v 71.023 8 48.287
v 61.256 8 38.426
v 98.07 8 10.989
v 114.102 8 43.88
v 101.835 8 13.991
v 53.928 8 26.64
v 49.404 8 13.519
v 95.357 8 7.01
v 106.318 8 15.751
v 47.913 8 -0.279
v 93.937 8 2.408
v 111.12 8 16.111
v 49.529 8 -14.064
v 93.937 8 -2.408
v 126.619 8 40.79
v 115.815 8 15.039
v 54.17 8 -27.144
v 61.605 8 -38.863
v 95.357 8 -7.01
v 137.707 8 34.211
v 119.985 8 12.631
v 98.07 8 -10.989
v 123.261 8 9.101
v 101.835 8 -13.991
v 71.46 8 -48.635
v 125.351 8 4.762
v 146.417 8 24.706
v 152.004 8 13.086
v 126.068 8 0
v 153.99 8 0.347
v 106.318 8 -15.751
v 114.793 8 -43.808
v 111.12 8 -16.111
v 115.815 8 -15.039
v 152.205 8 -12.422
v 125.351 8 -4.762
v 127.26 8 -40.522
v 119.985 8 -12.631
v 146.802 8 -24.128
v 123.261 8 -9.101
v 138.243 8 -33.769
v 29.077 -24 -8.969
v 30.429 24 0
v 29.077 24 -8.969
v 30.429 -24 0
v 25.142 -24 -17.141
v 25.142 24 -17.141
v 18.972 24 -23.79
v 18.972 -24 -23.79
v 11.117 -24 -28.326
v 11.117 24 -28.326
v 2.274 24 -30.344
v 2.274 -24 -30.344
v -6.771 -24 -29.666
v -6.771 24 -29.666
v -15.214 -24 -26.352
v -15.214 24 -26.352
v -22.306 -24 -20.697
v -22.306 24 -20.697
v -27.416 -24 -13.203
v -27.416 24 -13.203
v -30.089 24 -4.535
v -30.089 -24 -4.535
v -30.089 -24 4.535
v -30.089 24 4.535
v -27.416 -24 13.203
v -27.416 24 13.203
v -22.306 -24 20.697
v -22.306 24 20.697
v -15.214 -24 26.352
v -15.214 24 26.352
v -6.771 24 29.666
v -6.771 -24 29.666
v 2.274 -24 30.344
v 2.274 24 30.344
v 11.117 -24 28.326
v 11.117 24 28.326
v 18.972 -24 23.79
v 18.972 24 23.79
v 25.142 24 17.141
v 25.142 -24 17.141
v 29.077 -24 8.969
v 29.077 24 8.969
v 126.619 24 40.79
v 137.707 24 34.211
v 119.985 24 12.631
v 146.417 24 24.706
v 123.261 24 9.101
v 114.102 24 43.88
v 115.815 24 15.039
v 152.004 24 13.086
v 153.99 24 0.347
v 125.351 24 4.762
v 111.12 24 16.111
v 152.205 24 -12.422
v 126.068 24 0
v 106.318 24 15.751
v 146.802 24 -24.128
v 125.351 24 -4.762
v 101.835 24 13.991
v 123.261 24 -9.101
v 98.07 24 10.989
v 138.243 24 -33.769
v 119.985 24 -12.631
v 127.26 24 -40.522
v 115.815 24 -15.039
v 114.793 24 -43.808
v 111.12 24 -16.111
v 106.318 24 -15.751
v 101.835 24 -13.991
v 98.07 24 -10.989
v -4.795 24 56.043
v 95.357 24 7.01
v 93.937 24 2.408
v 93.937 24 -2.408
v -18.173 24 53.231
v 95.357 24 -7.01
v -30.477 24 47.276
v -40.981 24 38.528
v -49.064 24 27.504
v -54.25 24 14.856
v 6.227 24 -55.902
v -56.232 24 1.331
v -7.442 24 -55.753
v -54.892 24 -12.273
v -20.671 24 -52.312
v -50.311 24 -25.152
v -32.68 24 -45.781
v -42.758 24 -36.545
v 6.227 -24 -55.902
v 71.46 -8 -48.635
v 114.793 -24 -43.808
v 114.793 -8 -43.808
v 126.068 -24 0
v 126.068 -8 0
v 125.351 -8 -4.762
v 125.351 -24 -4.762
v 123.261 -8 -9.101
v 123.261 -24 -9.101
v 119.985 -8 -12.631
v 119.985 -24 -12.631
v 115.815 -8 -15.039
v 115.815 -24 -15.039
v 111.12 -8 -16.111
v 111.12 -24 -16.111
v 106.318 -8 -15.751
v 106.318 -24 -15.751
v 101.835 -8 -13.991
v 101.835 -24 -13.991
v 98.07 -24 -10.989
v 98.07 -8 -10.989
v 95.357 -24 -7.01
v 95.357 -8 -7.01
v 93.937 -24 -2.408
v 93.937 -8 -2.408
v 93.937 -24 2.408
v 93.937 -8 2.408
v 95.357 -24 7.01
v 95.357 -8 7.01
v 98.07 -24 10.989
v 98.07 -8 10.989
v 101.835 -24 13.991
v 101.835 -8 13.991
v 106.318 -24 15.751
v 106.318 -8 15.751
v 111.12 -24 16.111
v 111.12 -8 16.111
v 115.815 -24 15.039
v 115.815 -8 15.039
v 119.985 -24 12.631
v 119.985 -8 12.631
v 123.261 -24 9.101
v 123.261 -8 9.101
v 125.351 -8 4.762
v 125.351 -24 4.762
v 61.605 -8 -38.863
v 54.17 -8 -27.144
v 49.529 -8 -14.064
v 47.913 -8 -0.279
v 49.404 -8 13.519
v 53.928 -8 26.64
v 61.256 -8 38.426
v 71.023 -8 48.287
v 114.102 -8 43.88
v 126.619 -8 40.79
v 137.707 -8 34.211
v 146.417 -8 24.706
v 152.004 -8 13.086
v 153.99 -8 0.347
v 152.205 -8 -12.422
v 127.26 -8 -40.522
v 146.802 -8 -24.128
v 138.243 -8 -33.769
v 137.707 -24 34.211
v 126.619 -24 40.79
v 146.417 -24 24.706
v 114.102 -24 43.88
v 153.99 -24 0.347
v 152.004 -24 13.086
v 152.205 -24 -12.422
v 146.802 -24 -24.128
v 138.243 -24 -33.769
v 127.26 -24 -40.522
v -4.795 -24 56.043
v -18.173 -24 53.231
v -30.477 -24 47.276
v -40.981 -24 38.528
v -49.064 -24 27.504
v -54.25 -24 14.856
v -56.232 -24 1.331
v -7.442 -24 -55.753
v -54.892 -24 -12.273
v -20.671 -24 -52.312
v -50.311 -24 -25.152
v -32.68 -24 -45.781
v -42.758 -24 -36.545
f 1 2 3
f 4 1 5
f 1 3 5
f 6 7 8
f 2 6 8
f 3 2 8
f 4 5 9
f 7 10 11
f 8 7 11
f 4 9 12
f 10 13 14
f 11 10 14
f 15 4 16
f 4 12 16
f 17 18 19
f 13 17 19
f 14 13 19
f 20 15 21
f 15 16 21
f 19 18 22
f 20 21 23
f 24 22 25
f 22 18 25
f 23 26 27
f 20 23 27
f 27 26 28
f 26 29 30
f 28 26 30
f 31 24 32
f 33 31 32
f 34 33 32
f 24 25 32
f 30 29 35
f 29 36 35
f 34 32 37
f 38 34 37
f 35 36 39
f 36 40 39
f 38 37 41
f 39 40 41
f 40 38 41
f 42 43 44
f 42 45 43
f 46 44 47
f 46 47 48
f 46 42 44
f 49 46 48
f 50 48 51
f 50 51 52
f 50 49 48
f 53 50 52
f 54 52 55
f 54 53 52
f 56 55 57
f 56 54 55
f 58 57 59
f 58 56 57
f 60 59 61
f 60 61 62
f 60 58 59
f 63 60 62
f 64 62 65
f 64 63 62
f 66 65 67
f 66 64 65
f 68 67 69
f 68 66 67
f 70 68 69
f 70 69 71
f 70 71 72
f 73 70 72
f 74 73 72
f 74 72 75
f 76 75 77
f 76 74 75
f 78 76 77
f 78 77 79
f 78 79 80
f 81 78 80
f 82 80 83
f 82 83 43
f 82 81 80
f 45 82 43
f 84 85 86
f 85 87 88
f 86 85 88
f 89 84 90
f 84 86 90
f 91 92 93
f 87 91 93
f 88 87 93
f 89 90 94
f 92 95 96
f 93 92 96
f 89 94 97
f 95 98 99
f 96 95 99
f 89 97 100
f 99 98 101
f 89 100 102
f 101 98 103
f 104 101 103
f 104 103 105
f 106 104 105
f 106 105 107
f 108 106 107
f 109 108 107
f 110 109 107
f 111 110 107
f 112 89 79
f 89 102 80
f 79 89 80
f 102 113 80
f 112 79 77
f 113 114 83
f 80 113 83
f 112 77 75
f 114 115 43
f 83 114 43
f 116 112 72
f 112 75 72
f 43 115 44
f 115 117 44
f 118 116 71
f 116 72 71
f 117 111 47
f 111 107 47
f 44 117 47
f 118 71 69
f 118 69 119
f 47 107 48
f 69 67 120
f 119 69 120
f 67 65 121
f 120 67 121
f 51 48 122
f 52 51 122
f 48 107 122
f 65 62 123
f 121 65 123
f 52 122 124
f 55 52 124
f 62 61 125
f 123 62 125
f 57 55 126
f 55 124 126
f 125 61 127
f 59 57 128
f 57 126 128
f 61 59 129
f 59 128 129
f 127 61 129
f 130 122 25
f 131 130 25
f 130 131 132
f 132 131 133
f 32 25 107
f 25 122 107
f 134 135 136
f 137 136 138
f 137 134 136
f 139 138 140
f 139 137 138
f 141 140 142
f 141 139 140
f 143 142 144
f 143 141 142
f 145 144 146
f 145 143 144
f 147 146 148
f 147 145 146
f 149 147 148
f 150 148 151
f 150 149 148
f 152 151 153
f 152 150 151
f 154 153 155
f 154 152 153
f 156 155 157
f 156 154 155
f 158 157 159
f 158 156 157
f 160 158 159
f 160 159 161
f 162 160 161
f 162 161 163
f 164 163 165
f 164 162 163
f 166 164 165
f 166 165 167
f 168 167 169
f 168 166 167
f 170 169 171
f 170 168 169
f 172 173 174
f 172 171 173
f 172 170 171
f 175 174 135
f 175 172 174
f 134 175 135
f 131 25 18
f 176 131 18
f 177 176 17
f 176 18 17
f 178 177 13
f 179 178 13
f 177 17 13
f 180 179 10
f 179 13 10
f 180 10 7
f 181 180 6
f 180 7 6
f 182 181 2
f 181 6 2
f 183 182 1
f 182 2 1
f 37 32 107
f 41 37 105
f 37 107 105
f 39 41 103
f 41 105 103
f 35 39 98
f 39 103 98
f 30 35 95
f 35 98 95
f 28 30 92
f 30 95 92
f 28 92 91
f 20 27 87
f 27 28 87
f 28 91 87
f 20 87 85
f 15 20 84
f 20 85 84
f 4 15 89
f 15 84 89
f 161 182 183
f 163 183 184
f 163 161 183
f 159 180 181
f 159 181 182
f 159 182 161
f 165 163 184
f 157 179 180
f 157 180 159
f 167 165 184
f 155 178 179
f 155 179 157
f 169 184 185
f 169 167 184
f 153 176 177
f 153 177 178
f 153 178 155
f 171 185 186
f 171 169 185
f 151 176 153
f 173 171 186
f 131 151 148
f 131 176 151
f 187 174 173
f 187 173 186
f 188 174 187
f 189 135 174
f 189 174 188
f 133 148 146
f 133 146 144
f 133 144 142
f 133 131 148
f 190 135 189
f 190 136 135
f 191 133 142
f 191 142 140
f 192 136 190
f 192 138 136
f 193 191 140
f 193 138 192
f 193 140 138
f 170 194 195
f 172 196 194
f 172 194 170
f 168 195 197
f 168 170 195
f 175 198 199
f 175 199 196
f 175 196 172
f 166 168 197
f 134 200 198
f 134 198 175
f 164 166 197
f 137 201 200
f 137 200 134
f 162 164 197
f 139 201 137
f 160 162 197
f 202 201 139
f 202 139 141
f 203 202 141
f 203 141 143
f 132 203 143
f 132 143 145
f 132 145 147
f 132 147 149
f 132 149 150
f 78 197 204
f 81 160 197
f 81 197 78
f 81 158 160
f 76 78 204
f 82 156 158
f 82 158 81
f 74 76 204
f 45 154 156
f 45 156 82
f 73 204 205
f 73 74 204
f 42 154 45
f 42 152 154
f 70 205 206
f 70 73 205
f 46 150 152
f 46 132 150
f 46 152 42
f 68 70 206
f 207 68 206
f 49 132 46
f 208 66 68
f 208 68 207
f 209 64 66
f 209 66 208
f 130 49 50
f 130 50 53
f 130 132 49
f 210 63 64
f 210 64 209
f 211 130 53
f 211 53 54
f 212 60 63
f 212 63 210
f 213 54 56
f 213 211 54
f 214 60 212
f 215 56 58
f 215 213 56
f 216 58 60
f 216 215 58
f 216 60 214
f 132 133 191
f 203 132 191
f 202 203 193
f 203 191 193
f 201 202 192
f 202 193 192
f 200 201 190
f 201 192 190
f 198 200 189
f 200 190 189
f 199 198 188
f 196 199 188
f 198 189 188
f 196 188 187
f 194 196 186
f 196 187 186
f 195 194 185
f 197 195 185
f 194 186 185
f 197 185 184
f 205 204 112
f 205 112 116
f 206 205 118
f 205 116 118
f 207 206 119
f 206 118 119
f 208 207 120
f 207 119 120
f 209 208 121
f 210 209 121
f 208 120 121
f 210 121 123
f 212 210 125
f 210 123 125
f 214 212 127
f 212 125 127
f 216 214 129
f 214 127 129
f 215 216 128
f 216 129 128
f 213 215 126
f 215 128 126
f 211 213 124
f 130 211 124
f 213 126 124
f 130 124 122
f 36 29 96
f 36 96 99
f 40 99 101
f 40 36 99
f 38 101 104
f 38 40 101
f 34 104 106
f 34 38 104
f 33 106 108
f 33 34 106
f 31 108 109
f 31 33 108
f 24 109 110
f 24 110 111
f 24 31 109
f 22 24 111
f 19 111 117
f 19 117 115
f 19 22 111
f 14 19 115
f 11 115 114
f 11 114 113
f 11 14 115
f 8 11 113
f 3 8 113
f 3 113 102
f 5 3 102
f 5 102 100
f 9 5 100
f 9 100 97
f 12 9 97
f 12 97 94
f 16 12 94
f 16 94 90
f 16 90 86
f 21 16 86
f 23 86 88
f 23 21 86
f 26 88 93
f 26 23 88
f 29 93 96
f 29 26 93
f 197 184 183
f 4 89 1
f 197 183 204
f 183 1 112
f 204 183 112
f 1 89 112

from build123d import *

# Parameters (mm, degrees)
SKETCH_1_R          = 30.428996358
SKETCH_1_R_2        = 16.155751461
EXTRUDE_2_DEPTH     = 24
SKETCH_2_R          = 62
CUT_EXTRUDE_1_DEPTH = 8


with BuildPart() as part:
    # Эскиз1 → Бобышка-Вытянуть2 (new body, symmetric)
    with BuildSketch(Plane(origin=(0, 0, 0), x_dir=(1, 0, 0), z_dir=(0, 1, 0))):
        with BuildLine():
            Line((6.227294987, 55.90193086), (114.792593034, 43.808106445))
            ThreePointArc((114.792593034, 43.808106445), (153.990225093, -0.347161193), (114.101954958, -43.879539083))
            Line((114.101954958, -43.879539083), (-4.795118465, -56.042947064))
            ThreePointArc((-4.795118465, -56.042947064), (-55.977019444, 5.511657733), (6.227294987, 55.90193086))
        make_face()
        Circle(SKETCH_1_R, mode=Mode.SUBTRACT)
        with Locations((109.912511122, 0)):
            Circle(SKETCH_1_R_2, mode=Mode.SUBTRACT)
    extrude(amount=EXTRUDE_2_DEPTH, both=True)

    # Эскиз2 → Вырез-Вытянуть1 (cut, symmetric)
    with BuildSketch(Plane(origin=(0, 0, 0), x_dir=(1, 0, 0), z_dir=(0, 1, 0))):
        with Locations((109.912511122, 0)):
            Circle(SKETCH_2_R)
    extrude(amount=CUT_EXTRUDE_1_DEPTH, both=True, mode=Mode.SUBTRACT)


solid = part.part
